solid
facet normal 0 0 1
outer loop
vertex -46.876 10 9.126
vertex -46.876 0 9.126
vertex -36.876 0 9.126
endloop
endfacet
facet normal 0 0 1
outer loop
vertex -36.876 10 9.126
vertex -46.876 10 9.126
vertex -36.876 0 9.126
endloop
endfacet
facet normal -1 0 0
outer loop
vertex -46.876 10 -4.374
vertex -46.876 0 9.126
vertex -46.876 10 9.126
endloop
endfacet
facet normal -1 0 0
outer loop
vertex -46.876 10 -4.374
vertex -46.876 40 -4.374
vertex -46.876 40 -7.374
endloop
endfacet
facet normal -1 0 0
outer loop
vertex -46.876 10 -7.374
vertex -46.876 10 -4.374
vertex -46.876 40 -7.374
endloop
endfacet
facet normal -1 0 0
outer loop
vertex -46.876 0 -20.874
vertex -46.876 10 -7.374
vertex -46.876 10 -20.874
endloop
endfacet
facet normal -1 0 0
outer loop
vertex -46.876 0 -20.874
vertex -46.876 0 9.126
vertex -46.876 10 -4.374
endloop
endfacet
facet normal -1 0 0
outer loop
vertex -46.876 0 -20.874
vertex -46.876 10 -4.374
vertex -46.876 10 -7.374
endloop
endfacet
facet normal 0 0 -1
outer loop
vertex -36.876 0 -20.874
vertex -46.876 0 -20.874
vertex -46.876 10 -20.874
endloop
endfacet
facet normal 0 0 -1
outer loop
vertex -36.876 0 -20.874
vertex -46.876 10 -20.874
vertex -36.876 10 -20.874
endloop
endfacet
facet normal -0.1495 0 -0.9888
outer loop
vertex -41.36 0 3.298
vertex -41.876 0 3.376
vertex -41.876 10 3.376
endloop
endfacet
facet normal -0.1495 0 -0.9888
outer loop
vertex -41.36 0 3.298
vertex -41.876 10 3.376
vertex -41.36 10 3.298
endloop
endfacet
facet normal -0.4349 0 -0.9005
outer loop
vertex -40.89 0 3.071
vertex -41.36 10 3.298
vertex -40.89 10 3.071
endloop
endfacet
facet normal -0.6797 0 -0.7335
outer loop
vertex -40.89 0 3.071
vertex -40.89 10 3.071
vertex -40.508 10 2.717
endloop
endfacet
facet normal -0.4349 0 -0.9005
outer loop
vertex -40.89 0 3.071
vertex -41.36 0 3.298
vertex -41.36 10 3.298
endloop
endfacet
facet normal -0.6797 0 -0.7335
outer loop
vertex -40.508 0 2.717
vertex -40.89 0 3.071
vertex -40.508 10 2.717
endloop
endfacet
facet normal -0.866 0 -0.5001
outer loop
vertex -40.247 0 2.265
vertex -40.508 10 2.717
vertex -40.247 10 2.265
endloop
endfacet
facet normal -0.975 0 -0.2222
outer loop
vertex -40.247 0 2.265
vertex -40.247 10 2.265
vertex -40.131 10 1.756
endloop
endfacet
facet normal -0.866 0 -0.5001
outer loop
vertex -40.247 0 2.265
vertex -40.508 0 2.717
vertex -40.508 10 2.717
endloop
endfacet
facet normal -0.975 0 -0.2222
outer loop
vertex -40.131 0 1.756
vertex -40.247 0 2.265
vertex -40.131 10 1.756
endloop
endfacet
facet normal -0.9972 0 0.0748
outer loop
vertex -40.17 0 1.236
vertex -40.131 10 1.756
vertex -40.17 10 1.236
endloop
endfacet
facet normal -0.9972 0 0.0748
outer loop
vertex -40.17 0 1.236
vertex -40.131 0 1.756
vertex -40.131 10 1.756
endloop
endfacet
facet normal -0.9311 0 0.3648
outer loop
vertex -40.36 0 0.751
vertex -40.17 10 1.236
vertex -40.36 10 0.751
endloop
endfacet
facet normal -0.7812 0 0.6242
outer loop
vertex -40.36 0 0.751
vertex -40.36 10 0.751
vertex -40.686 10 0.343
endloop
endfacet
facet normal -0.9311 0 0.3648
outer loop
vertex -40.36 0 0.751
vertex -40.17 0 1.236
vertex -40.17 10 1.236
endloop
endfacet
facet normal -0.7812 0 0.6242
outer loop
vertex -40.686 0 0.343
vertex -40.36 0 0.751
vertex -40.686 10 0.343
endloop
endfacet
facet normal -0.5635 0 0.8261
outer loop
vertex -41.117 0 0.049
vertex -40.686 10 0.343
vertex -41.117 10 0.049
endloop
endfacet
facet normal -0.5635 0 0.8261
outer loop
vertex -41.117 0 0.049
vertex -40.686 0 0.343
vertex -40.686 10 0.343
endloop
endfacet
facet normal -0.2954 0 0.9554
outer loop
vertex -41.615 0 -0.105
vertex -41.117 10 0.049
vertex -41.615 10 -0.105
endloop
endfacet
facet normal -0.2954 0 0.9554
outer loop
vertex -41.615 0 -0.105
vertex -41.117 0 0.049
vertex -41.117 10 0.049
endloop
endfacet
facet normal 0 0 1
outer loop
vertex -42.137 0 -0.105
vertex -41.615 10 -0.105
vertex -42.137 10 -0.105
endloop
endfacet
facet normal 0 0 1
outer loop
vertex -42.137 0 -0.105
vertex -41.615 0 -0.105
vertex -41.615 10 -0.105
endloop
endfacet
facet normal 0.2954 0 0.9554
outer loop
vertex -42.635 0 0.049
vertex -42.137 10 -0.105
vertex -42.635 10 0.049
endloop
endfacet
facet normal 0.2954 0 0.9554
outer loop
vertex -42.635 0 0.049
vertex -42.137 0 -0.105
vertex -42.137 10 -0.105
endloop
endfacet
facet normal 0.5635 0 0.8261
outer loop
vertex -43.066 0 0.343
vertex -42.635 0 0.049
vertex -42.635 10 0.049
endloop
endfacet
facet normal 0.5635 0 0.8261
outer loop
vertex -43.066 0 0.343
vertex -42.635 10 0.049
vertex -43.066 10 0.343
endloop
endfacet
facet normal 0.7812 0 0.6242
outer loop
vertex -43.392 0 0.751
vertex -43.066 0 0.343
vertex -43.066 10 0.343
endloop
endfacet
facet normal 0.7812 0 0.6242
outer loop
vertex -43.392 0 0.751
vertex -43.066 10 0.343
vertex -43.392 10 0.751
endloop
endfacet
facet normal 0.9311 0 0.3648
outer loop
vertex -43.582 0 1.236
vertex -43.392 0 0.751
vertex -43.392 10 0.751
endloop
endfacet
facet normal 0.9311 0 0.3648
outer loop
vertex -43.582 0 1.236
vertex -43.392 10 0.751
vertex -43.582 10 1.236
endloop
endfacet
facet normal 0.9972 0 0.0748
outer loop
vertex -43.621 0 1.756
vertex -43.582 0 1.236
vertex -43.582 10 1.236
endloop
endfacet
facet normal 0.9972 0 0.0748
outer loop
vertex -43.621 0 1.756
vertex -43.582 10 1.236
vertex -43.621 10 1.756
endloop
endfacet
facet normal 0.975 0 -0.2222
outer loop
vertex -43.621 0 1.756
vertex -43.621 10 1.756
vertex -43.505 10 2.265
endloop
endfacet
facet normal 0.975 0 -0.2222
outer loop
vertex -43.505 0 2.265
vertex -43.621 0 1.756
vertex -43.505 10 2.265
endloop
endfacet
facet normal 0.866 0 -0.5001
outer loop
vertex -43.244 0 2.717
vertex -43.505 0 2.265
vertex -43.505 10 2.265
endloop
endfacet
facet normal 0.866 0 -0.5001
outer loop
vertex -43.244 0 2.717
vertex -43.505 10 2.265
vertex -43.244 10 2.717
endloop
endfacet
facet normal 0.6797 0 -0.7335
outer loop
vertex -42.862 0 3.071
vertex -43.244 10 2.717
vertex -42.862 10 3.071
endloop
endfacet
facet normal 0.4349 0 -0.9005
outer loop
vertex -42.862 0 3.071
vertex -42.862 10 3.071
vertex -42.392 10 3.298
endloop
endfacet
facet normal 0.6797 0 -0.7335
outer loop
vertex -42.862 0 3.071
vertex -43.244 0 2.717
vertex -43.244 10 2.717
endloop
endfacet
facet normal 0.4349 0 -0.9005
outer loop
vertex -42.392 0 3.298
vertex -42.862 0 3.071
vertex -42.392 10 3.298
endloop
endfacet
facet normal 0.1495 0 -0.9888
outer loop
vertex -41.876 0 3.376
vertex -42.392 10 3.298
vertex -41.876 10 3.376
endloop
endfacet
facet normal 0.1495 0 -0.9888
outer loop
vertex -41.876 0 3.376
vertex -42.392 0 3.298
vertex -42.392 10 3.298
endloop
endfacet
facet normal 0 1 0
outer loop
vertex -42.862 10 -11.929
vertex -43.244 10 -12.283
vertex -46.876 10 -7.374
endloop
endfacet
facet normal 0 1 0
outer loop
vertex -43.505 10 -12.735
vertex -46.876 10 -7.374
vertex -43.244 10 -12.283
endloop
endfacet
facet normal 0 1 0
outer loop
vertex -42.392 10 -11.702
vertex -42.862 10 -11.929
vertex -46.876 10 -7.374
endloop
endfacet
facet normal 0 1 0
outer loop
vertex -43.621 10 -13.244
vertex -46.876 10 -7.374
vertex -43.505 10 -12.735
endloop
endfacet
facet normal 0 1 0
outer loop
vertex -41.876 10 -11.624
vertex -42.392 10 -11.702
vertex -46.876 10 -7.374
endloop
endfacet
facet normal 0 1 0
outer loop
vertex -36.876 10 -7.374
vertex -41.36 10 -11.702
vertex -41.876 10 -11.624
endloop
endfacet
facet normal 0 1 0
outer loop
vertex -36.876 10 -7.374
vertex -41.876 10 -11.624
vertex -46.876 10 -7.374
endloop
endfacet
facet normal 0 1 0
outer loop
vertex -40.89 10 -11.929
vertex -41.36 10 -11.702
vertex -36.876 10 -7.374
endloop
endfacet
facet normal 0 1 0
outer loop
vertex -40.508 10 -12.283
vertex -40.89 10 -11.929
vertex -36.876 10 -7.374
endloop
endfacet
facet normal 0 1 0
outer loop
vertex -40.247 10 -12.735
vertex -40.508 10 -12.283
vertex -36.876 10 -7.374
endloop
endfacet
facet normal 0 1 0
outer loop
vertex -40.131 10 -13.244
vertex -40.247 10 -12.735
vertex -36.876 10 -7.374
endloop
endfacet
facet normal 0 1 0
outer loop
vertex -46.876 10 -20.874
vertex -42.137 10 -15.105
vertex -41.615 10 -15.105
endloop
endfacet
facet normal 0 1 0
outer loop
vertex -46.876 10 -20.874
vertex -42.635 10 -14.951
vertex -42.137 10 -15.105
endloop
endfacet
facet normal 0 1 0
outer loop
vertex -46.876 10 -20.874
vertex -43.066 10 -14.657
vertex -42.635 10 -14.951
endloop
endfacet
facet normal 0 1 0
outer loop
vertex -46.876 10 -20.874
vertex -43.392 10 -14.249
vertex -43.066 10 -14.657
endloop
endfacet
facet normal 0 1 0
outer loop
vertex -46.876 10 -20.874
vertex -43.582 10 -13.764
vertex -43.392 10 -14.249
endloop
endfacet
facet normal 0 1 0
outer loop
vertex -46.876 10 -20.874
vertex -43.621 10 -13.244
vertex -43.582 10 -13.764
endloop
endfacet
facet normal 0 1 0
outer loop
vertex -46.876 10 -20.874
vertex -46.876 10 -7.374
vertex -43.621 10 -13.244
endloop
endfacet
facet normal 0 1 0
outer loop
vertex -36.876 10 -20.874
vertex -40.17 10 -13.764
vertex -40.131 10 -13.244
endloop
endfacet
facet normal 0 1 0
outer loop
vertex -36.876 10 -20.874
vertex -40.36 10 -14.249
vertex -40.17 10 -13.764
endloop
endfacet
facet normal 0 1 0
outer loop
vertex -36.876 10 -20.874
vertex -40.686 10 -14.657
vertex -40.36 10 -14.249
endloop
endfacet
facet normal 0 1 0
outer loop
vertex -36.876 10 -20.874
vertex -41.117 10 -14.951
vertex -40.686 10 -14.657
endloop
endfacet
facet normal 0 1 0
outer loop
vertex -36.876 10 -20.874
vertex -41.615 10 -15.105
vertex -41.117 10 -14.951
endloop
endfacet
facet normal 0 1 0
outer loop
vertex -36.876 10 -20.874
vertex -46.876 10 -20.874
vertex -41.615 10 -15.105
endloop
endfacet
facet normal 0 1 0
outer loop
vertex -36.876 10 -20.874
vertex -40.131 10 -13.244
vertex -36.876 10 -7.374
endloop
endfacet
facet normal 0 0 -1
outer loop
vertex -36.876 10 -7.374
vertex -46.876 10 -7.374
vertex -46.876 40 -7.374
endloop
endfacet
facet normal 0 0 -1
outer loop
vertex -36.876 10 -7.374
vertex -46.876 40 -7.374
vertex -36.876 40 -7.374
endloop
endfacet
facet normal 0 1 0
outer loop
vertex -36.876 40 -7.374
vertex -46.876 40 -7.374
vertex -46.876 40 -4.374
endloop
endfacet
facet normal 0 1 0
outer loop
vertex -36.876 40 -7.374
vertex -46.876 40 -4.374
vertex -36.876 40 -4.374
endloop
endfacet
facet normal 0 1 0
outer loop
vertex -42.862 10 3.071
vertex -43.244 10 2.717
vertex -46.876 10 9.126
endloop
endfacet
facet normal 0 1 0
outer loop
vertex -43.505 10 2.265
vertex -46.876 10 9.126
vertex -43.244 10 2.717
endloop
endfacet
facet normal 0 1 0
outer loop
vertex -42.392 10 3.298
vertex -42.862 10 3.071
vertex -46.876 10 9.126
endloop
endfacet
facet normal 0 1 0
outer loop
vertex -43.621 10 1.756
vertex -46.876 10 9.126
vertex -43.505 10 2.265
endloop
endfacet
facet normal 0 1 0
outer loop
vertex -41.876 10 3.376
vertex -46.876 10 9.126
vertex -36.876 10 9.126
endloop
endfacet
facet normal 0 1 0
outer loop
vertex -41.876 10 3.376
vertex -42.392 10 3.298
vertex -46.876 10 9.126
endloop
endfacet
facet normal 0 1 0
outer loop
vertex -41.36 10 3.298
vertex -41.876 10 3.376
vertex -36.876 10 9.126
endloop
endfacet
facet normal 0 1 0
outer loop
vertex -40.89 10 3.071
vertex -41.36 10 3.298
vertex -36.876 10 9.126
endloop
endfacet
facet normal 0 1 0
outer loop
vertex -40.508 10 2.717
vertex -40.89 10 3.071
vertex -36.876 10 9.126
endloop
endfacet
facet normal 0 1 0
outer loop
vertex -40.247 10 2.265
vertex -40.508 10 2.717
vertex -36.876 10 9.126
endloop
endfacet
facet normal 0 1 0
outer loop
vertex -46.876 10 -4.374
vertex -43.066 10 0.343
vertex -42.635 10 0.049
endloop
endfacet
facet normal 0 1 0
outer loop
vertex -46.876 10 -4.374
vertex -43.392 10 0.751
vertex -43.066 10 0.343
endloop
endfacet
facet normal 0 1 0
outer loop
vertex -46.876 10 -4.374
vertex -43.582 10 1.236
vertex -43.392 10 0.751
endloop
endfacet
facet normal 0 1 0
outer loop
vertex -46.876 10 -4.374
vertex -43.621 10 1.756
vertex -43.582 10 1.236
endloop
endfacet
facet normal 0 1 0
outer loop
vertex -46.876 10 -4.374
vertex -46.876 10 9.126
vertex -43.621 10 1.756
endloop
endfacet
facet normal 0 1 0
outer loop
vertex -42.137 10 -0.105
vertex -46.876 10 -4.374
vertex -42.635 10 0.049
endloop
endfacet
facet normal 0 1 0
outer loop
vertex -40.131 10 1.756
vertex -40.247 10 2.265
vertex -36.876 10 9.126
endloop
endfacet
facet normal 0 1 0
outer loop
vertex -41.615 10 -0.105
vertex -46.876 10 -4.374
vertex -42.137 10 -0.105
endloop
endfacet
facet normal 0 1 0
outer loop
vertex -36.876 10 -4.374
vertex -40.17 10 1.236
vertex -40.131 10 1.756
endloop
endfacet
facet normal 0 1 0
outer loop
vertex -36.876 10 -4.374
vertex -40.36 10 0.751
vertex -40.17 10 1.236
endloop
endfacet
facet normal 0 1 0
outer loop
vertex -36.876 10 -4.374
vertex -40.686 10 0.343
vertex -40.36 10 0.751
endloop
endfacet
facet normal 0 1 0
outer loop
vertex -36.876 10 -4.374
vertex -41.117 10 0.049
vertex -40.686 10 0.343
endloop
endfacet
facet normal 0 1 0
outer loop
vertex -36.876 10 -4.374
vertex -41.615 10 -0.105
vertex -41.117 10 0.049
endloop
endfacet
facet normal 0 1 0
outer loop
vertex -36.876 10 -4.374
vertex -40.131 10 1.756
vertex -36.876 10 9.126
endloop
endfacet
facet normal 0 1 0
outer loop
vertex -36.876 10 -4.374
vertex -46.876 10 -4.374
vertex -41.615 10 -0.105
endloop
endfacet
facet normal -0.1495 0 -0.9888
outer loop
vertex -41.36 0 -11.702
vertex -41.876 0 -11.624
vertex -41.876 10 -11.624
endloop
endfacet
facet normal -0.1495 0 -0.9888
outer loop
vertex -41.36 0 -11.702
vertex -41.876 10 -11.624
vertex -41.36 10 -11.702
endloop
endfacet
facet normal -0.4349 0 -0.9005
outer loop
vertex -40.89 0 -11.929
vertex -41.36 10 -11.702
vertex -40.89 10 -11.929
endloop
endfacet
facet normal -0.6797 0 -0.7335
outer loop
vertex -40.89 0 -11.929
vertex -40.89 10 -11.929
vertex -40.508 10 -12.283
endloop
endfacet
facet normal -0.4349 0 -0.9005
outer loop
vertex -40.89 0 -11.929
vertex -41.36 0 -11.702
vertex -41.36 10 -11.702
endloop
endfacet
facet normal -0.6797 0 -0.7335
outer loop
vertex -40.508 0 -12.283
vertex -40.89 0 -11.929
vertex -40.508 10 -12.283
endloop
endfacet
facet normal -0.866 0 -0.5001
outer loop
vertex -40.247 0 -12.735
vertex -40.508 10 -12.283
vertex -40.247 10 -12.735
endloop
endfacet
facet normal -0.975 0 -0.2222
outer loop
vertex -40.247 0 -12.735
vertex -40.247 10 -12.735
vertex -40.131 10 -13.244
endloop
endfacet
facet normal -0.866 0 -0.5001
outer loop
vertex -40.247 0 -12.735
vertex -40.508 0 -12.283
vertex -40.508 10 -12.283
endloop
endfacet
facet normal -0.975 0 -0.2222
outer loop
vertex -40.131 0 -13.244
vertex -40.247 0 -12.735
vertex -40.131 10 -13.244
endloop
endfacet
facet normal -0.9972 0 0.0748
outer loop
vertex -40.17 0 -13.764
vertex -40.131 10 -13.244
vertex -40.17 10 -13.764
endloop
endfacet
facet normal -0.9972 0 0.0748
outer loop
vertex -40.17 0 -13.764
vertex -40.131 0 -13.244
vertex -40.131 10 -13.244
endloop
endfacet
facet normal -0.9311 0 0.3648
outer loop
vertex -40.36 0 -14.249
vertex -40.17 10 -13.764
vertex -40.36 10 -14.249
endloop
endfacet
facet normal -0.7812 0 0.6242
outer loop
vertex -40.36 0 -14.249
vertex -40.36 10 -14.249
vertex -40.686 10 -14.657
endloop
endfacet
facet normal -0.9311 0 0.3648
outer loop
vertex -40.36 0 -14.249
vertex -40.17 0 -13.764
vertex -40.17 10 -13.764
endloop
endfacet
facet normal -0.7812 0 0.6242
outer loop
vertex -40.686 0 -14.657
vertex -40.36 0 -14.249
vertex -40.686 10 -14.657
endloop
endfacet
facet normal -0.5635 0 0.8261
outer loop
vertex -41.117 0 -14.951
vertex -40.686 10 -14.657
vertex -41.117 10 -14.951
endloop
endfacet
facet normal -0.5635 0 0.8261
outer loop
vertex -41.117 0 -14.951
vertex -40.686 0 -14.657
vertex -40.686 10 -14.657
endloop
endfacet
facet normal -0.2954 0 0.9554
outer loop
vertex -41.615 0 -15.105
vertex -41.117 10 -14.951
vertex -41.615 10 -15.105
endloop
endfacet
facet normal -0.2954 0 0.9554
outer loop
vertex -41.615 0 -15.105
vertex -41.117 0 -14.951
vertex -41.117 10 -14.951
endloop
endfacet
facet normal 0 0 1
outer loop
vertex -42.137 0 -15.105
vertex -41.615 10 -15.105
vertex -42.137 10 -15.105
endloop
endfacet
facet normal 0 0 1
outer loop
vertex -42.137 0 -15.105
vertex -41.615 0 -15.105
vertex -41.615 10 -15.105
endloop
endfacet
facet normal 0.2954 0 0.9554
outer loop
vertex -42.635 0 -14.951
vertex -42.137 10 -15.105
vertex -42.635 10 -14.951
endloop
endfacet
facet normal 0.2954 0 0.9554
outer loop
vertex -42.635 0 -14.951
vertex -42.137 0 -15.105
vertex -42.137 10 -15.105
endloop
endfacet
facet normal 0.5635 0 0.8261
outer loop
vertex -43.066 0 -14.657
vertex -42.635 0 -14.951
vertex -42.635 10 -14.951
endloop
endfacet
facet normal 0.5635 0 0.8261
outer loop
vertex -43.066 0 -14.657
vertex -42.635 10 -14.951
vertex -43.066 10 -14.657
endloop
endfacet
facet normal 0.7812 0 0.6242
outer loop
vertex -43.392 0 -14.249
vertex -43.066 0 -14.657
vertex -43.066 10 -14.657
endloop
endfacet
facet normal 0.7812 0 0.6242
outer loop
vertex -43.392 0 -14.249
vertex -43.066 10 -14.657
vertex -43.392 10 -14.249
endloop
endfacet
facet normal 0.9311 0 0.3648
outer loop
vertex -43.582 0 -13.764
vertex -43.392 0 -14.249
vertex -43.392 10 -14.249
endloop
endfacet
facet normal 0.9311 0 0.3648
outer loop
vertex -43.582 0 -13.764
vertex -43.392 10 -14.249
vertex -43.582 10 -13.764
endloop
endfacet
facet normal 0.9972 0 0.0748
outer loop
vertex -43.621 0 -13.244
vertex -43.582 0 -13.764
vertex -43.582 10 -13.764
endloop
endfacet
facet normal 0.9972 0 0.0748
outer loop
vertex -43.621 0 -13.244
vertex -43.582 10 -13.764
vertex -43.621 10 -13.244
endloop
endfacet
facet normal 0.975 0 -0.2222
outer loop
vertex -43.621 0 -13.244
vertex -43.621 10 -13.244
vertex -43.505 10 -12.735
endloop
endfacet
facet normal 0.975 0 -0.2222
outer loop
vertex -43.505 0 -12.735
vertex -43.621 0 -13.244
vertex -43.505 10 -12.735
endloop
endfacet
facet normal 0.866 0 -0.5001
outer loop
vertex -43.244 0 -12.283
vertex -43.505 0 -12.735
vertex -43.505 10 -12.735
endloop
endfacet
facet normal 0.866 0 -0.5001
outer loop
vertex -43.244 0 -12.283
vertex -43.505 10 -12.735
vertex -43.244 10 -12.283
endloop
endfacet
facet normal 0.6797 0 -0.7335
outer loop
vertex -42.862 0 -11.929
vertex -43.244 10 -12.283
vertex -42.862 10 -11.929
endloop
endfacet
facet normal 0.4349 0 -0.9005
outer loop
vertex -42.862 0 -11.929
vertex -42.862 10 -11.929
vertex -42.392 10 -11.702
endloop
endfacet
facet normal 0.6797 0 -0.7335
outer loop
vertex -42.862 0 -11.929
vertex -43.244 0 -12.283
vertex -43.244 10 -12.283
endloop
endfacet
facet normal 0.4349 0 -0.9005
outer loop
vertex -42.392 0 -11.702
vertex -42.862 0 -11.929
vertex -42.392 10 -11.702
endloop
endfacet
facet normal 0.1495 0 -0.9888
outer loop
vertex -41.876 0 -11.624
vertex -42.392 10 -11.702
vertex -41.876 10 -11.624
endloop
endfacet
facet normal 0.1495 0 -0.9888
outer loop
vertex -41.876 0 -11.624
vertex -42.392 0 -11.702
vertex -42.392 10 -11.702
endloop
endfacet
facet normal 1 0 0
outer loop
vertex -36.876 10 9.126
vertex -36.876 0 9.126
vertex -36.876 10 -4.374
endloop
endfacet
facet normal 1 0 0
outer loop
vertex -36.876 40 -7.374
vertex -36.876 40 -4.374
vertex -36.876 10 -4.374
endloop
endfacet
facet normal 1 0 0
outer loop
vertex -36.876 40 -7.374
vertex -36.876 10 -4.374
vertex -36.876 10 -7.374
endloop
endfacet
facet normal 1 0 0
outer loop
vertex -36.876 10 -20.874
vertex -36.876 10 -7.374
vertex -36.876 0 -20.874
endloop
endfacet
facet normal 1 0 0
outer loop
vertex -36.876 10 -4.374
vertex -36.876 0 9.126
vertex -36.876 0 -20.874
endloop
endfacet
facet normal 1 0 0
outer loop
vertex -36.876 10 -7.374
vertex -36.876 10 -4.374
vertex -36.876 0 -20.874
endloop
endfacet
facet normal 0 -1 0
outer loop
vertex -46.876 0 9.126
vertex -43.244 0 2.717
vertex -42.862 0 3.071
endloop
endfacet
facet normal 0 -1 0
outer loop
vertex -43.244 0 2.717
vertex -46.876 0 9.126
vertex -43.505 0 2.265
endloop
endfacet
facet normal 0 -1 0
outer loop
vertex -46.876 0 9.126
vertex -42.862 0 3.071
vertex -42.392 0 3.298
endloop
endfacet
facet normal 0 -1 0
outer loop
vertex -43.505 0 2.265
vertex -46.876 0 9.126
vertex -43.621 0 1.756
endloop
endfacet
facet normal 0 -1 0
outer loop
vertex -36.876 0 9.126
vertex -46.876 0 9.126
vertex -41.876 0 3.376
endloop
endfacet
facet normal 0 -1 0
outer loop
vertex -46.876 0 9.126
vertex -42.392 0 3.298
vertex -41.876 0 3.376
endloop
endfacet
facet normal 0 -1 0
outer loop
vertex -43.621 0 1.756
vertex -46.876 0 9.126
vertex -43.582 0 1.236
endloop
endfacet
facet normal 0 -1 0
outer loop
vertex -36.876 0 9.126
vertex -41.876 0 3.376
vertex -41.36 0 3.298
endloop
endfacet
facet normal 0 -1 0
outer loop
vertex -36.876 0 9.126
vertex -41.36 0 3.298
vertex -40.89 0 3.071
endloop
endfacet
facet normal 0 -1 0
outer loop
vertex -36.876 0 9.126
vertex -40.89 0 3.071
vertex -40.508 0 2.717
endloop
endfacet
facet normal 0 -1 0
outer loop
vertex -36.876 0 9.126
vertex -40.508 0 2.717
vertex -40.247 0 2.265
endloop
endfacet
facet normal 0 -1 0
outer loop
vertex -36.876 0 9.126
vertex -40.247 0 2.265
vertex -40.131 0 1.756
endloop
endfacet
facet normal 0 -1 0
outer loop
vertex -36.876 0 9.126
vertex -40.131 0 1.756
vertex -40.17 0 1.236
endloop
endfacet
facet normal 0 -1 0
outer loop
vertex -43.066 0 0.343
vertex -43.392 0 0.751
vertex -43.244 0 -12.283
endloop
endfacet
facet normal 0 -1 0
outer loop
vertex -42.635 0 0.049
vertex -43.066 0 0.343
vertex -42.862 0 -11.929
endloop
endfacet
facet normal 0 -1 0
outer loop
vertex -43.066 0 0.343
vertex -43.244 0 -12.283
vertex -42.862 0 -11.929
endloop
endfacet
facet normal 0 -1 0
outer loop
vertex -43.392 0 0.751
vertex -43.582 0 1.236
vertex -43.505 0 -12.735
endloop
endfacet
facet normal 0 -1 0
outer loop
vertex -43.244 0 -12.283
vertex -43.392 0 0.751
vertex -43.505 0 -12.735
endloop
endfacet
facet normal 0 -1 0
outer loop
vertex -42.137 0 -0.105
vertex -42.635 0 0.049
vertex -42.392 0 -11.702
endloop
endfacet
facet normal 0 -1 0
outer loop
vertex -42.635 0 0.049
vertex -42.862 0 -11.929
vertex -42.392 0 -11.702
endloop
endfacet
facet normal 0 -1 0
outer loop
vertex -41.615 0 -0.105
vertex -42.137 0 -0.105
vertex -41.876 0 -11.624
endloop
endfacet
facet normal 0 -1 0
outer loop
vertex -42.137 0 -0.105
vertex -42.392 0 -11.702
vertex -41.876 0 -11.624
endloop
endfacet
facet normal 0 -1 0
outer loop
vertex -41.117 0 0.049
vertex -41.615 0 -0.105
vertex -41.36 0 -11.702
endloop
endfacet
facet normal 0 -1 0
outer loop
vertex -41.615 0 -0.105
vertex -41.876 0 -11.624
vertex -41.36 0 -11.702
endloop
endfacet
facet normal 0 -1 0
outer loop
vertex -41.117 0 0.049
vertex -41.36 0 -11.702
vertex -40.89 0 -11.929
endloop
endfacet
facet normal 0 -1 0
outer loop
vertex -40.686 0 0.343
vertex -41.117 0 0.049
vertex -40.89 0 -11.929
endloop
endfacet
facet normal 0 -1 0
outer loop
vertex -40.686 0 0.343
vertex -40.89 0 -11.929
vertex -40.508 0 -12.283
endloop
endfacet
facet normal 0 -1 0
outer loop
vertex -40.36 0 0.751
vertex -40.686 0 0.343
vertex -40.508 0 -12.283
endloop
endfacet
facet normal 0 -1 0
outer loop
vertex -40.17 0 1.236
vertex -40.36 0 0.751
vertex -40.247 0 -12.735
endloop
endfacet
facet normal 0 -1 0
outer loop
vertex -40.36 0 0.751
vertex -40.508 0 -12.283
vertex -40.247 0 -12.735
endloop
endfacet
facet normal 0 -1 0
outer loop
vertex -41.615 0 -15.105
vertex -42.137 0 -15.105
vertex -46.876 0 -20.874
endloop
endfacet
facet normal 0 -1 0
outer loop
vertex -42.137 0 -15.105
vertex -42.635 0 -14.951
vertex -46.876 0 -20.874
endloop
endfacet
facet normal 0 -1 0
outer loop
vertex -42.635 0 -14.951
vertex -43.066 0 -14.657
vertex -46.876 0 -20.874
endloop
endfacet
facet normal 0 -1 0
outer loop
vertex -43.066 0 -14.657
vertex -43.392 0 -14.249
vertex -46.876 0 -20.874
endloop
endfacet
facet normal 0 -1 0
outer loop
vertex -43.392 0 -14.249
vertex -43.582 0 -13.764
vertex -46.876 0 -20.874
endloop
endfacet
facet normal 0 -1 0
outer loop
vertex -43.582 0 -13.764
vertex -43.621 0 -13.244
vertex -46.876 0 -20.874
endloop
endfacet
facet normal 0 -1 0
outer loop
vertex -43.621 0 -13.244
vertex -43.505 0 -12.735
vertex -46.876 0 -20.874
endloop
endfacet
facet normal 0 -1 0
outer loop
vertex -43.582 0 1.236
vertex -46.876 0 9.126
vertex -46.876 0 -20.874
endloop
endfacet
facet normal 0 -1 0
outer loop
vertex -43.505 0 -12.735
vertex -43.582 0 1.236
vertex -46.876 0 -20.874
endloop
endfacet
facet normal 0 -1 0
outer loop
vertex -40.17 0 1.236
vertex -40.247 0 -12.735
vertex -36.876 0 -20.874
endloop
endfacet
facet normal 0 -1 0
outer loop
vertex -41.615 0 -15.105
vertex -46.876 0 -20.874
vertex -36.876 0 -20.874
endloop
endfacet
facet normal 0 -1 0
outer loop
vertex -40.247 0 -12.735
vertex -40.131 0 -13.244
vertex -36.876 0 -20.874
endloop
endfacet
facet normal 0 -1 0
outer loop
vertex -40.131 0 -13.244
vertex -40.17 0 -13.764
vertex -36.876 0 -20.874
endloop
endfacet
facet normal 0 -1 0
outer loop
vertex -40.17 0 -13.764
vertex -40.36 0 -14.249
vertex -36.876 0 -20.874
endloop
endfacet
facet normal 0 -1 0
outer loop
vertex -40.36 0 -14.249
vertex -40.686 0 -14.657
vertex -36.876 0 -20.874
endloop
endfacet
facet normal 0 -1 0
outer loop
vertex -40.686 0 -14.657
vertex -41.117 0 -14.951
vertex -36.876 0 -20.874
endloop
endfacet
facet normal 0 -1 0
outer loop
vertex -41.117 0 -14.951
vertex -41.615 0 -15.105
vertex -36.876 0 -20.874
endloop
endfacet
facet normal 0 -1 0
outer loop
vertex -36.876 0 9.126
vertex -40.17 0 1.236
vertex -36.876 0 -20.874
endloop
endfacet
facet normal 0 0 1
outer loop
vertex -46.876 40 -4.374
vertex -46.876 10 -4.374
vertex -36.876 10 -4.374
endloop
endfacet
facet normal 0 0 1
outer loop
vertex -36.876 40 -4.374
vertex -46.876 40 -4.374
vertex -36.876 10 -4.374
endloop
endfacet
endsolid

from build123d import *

# Parameters (mm, degrees)
SKETCH2_W           = 10
SKETCH2_H           = 30
SKETCH2_R           = 1.75
BOSS_EXTRUDE1_DEPTH = 10
SKETCH4_W           = 10
SKETCH4_H           = 1.5
BOSS_EXTRUDE3_DEPTH = 30


with BuildPart() as part:
    # Sketch2 → Boss-Extrude1 (new body)
    with BuildSketch(Plane(origin=(0, 0, 0), x_dir=(1, 0, 0), z_dir=(0, 1, 0))):
        with Locations((-41.876032971, 5.874496677)):
            Rectangle(SKETCH2_W, SKETCH2_H)
        with Locations(Location((-41.876032971, -1.625503323, 0), (0, 0, 270))):
            Circle(SKETCH2_R, mode=Mode.SUBTRACT)
        with Locations(Location((-41.876032971, 13.374496677, 0), (0, 0, 270))):
            Circle(SKETCH2_R, mode=Mode.SUBTRACT)
    extrude(amount=BOSS_EXTRUDE1_DEPTH)

    # Sketch4 → Boss-Extrude3 (add)
    with BuildSketch(Plane(origin=(0, 10, 0), x_dir=(1, 0, 0), z_dir=(0, 1, 0))):
        with Locations((-41.876032971, 6.624496677)):
            Rectangle(SKETCH4_W, SKETCH4_H)
        with Locations((-41.876032971, 5.124496677)):
            Rectangle(SKETCH4_W, SKETCH4_H)
    extrude(amount=BOSS_EXTRUDE3_DEPTH)


solid = part.part
